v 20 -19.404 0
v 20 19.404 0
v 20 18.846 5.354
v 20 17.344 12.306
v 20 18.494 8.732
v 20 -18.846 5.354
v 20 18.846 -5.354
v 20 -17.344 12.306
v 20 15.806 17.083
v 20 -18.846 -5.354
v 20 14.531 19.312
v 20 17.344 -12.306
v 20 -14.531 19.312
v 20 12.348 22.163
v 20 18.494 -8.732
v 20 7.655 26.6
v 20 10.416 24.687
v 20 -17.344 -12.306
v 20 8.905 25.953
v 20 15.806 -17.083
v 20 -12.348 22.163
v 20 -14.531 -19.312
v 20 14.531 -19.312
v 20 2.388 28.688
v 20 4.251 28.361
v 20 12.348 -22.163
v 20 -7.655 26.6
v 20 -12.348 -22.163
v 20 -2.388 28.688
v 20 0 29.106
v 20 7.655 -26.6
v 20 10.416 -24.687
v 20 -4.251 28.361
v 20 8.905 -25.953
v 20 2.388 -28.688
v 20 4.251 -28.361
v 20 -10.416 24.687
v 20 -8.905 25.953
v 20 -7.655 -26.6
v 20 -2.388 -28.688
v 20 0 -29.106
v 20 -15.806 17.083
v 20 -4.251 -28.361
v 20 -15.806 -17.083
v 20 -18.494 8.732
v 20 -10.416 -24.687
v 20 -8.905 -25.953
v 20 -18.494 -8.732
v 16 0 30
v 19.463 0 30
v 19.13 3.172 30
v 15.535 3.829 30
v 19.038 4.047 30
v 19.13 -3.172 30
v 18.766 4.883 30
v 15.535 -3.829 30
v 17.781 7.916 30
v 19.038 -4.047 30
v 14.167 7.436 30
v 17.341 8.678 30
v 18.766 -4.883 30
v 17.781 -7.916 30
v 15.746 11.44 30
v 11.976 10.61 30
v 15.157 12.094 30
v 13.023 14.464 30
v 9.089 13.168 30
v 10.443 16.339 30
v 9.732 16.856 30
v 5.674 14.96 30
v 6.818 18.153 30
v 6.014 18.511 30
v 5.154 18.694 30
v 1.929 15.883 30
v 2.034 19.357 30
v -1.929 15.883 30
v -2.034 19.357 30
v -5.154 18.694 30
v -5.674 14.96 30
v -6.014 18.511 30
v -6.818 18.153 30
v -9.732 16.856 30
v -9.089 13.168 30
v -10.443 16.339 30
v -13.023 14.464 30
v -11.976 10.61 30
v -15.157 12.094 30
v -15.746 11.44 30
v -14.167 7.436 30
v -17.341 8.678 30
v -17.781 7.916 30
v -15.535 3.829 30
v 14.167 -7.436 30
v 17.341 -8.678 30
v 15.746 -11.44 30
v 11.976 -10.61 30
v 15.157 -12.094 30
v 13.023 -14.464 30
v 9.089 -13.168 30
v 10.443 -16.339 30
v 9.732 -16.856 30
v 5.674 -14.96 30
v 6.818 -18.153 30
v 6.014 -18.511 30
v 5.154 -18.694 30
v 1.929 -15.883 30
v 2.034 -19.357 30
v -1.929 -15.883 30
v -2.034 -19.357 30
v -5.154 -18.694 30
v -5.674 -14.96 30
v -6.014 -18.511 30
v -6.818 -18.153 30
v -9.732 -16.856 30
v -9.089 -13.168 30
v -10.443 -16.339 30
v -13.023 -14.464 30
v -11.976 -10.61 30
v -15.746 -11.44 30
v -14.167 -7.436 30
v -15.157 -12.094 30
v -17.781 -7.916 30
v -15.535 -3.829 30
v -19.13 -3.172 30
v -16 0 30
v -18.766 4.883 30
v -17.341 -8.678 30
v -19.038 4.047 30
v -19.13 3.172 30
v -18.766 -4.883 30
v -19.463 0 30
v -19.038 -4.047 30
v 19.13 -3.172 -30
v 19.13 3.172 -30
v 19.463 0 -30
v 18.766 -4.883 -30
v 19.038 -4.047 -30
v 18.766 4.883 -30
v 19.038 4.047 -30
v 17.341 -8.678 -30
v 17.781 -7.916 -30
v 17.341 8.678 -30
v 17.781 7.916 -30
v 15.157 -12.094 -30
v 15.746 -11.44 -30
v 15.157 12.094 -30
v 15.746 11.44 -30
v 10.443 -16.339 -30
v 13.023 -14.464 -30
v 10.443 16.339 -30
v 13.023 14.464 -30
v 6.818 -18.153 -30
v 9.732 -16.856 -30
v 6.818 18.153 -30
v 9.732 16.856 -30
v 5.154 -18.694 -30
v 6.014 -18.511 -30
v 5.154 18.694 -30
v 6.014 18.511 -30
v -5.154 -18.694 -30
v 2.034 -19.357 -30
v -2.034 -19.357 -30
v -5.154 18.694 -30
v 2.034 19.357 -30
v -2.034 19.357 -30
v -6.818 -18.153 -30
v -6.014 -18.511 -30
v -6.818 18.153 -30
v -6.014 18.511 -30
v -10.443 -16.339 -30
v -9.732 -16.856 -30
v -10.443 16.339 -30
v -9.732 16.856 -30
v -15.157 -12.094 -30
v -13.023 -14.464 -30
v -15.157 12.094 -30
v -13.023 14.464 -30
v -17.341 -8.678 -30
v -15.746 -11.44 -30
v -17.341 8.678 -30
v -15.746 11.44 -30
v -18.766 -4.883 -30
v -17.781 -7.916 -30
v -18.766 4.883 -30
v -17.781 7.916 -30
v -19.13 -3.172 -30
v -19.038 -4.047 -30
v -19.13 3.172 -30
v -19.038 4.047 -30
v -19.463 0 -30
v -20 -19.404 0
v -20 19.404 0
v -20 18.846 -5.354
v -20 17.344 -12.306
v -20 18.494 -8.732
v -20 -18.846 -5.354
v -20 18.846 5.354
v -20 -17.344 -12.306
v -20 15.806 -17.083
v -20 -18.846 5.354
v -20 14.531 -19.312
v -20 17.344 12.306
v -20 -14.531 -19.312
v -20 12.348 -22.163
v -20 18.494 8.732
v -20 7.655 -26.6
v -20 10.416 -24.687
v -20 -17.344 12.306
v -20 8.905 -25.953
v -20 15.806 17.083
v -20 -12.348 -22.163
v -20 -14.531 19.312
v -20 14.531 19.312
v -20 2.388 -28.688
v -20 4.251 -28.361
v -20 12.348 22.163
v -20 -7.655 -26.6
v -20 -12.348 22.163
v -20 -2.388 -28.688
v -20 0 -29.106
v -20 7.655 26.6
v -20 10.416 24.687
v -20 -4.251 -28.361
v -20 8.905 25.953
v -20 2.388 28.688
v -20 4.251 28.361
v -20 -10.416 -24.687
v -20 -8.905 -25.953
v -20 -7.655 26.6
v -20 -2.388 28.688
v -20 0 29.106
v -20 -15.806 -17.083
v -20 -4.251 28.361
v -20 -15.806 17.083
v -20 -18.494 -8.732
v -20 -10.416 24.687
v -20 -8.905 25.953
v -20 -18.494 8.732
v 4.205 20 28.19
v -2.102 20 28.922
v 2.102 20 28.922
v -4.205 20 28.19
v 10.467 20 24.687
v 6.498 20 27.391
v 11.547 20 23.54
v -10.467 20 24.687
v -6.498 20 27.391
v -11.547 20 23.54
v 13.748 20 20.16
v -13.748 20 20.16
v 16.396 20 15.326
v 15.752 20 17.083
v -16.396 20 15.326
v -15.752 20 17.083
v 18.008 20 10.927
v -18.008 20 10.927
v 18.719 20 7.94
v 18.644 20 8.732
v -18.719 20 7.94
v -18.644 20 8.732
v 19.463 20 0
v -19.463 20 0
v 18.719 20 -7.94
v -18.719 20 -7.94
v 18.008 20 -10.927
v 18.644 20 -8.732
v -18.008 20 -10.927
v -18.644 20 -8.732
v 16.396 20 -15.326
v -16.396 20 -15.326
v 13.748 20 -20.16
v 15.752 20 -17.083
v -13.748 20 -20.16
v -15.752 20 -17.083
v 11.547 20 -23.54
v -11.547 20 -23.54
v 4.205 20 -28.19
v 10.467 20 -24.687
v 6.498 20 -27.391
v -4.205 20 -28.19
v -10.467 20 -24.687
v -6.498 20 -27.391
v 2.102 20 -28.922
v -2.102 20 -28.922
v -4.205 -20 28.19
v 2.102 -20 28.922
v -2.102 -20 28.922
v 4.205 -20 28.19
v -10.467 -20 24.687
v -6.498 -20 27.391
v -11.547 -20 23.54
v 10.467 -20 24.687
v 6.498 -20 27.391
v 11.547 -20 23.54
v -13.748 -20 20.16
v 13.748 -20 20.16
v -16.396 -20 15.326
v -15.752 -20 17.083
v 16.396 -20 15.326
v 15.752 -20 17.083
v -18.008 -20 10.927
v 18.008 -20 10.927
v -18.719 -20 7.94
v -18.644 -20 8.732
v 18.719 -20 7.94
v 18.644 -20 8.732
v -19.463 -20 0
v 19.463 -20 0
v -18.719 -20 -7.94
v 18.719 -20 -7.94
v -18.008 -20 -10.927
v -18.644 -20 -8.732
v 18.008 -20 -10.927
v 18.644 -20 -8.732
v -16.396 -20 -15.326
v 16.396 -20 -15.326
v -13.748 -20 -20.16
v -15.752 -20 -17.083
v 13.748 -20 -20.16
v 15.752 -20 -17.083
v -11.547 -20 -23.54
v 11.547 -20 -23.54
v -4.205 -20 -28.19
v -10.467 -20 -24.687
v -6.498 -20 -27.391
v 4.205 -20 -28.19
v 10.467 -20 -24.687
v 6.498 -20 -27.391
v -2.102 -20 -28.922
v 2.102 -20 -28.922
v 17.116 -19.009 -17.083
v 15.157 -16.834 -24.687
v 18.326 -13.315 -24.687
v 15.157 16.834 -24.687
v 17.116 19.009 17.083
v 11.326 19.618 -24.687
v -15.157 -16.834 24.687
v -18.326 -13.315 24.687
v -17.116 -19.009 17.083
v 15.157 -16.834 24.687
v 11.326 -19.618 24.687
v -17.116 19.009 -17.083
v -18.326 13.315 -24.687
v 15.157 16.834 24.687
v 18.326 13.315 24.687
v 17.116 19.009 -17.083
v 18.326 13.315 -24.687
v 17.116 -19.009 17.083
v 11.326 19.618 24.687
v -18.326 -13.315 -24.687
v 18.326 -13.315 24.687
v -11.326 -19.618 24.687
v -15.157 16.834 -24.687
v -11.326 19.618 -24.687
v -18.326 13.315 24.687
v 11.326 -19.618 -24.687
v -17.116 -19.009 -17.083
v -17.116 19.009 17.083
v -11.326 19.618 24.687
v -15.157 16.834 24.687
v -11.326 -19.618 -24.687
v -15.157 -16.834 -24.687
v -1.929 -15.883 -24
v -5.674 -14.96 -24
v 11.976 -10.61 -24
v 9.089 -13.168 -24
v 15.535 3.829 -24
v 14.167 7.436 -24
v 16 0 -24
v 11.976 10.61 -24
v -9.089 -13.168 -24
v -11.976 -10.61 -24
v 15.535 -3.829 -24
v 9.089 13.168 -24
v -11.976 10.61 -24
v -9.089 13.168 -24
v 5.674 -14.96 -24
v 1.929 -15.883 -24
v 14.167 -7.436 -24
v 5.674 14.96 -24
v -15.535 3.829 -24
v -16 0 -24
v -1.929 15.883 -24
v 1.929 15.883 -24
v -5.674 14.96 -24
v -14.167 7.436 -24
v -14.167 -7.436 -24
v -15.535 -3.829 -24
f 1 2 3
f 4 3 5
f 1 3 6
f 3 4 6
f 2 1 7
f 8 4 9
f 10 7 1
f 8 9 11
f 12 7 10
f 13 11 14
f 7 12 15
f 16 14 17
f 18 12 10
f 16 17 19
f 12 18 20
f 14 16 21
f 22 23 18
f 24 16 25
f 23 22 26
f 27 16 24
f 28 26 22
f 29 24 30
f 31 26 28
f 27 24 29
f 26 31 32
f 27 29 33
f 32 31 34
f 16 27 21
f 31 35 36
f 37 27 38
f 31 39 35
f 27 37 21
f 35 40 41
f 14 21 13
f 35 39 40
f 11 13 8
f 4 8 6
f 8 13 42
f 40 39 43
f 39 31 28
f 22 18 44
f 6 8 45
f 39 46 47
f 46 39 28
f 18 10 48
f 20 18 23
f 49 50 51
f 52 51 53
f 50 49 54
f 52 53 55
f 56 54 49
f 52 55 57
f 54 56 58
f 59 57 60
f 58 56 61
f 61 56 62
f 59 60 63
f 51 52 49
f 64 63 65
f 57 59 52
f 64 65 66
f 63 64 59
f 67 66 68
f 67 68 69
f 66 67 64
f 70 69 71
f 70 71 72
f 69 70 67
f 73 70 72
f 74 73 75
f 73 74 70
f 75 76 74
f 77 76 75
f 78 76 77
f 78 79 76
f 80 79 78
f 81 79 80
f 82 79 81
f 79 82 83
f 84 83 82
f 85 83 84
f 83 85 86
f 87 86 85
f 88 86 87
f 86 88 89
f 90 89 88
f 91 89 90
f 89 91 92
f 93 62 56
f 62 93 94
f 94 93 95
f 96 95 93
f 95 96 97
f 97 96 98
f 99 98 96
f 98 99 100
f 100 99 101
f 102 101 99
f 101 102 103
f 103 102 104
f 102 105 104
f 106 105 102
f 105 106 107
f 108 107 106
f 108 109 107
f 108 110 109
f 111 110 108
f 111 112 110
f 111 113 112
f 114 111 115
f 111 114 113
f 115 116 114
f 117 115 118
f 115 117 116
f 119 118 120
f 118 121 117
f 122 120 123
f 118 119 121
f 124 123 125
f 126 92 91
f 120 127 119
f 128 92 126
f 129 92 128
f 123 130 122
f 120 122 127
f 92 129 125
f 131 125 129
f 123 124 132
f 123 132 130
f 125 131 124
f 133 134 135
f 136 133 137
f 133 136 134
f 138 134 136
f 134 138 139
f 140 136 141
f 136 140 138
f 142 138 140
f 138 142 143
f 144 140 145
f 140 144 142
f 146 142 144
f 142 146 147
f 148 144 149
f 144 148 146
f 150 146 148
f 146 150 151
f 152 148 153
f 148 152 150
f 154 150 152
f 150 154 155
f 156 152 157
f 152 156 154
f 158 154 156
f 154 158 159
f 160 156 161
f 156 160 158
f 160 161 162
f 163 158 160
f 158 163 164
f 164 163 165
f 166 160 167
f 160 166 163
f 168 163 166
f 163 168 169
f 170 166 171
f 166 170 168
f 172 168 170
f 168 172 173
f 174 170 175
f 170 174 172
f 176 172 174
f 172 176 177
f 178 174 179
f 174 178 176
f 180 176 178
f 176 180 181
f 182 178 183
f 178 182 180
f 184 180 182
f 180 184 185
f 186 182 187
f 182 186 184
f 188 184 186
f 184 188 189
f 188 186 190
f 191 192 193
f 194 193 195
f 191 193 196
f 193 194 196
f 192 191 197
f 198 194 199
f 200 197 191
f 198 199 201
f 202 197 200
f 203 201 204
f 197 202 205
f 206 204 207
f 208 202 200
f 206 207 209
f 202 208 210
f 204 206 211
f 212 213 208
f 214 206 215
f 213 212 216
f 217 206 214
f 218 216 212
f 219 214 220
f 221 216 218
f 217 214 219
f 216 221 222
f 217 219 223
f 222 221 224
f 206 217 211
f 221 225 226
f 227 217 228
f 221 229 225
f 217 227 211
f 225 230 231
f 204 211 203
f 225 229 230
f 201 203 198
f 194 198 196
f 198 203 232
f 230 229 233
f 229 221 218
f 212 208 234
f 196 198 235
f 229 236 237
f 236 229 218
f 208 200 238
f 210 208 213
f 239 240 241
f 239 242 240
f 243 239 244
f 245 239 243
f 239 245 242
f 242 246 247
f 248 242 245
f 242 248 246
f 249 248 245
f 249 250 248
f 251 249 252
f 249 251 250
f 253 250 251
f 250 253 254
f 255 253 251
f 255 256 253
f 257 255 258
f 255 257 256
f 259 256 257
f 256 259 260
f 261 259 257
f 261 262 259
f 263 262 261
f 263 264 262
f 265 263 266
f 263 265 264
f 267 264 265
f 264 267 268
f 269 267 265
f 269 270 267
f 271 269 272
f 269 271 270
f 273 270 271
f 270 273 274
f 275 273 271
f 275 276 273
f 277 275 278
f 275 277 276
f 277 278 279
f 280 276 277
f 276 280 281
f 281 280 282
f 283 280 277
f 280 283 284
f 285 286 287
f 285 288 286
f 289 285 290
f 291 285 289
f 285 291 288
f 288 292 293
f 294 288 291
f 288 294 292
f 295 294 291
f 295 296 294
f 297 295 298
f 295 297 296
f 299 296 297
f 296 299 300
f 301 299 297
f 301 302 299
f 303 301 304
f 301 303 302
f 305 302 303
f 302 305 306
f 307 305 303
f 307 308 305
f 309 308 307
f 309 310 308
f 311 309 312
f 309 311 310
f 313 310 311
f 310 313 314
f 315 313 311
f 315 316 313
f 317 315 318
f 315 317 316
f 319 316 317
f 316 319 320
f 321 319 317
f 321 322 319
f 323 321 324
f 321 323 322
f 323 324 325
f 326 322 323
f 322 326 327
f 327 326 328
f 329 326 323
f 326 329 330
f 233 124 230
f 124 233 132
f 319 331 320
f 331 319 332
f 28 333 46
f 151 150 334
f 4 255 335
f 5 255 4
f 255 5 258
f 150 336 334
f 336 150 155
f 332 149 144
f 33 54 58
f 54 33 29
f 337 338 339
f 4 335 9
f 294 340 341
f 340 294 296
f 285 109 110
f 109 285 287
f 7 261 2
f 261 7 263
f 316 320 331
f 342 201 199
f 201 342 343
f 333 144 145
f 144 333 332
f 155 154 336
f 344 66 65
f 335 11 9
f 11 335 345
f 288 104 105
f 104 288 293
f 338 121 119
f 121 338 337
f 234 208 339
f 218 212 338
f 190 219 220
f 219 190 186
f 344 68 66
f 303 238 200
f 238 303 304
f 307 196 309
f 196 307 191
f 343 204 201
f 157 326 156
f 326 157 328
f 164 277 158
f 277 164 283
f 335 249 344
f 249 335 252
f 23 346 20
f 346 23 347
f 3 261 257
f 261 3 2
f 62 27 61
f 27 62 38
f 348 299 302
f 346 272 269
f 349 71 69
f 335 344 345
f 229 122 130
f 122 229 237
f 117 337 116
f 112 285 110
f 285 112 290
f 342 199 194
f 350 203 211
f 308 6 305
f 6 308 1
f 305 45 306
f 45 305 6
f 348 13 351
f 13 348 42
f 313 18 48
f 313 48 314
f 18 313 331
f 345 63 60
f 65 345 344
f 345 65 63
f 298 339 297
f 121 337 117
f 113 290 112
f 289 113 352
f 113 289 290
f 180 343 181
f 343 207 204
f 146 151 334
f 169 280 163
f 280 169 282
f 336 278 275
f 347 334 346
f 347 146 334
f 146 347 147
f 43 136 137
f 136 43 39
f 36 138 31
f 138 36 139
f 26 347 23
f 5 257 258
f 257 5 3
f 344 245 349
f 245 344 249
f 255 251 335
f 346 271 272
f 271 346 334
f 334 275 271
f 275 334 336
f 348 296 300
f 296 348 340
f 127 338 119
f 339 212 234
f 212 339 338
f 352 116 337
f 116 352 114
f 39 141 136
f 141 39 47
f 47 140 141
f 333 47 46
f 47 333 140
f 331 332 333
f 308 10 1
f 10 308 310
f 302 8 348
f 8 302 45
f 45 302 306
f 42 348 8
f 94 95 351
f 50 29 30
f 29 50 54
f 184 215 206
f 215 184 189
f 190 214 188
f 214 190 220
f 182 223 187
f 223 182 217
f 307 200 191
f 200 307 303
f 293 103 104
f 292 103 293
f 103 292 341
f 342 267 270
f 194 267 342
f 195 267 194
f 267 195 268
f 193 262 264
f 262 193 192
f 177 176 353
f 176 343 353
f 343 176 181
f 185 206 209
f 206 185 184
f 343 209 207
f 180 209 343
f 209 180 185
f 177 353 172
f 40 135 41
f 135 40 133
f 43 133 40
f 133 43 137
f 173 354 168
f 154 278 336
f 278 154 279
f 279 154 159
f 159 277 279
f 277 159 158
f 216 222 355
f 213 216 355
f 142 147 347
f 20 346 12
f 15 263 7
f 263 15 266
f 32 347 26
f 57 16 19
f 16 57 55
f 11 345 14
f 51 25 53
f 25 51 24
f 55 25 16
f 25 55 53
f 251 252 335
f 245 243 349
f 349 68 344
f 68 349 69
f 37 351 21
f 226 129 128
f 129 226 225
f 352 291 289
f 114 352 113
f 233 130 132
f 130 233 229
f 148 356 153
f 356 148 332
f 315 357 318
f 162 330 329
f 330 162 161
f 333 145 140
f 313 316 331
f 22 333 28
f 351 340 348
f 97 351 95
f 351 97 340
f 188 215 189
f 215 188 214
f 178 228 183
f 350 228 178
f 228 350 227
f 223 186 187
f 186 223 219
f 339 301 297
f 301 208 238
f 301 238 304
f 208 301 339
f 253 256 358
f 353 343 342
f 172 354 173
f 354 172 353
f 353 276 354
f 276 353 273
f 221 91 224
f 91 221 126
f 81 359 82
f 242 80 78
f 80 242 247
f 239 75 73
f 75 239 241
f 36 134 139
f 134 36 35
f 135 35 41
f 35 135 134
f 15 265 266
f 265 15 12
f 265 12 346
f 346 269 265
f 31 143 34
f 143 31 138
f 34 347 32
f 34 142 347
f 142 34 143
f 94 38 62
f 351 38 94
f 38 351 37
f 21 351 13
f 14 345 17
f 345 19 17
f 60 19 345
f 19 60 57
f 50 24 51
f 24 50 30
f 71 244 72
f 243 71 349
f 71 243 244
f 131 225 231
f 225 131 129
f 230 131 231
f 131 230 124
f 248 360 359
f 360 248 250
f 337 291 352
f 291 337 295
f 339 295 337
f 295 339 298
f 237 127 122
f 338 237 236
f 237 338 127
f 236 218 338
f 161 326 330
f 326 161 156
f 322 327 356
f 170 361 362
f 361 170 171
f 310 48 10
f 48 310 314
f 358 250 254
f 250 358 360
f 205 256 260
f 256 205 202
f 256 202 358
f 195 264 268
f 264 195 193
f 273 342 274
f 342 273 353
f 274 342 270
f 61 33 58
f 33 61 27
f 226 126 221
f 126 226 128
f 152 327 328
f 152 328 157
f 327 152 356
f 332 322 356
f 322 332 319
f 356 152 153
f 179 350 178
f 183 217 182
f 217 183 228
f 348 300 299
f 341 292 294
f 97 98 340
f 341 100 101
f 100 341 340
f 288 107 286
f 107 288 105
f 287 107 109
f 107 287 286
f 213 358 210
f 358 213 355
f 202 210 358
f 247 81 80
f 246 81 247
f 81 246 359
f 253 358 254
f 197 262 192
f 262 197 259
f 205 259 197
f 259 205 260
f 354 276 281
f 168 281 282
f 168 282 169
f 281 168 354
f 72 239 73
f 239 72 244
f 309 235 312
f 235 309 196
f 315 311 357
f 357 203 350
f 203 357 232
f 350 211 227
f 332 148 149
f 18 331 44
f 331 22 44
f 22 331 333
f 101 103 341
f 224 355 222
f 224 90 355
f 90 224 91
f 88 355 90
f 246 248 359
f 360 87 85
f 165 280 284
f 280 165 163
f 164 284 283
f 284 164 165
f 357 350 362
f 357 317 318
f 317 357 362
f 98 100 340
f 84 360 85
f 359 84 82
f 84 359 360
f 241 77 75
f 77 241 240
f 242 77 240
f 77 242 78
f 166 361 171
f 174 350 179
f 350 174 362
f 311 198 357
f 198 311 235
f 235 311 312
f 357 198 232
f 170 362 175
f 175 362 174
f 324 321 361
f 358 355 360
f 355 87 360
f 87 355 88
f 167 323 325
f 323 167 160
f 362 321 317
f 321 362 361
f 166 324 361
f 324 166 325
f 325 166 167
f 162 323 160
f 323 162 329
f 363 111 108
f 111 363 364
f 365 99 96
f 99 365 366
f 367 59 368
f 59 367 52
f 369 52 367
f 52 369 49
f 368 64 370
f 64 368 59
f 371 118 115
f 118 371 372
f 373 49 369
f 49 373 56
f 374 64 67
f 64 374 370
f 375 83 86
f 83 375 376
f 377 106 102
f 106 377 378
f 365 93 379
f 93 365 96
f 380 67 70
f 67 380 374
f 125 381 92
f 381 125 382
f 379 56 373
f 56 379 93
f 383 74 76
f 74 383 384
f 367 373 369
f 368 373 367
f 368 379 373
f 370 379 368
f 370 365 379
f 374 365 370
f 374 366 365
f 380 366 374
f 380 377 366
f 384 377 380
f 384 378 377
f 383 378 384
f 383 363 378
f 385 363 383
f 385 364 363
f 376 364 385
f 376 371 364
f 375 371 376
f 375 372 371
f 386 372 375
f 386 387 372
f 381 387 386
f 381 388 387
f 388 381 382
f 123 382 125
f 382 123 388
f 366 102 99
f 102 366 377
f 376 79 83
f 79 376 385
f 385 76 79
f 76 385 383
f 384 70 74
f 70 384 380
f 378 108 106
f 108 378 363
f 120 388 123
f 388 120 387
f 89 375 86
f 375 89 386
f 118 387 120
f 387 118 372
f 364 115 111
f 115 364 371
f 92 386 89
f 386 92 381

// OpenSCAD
   scale([2,2,3]) {
    difference() {
        intersection() {
          cube([20,20,20], center=true);
          sphere(14);
        }
        translate([0,0,-8]) 
            cylinder(r=8,h=22);
    }    
}
